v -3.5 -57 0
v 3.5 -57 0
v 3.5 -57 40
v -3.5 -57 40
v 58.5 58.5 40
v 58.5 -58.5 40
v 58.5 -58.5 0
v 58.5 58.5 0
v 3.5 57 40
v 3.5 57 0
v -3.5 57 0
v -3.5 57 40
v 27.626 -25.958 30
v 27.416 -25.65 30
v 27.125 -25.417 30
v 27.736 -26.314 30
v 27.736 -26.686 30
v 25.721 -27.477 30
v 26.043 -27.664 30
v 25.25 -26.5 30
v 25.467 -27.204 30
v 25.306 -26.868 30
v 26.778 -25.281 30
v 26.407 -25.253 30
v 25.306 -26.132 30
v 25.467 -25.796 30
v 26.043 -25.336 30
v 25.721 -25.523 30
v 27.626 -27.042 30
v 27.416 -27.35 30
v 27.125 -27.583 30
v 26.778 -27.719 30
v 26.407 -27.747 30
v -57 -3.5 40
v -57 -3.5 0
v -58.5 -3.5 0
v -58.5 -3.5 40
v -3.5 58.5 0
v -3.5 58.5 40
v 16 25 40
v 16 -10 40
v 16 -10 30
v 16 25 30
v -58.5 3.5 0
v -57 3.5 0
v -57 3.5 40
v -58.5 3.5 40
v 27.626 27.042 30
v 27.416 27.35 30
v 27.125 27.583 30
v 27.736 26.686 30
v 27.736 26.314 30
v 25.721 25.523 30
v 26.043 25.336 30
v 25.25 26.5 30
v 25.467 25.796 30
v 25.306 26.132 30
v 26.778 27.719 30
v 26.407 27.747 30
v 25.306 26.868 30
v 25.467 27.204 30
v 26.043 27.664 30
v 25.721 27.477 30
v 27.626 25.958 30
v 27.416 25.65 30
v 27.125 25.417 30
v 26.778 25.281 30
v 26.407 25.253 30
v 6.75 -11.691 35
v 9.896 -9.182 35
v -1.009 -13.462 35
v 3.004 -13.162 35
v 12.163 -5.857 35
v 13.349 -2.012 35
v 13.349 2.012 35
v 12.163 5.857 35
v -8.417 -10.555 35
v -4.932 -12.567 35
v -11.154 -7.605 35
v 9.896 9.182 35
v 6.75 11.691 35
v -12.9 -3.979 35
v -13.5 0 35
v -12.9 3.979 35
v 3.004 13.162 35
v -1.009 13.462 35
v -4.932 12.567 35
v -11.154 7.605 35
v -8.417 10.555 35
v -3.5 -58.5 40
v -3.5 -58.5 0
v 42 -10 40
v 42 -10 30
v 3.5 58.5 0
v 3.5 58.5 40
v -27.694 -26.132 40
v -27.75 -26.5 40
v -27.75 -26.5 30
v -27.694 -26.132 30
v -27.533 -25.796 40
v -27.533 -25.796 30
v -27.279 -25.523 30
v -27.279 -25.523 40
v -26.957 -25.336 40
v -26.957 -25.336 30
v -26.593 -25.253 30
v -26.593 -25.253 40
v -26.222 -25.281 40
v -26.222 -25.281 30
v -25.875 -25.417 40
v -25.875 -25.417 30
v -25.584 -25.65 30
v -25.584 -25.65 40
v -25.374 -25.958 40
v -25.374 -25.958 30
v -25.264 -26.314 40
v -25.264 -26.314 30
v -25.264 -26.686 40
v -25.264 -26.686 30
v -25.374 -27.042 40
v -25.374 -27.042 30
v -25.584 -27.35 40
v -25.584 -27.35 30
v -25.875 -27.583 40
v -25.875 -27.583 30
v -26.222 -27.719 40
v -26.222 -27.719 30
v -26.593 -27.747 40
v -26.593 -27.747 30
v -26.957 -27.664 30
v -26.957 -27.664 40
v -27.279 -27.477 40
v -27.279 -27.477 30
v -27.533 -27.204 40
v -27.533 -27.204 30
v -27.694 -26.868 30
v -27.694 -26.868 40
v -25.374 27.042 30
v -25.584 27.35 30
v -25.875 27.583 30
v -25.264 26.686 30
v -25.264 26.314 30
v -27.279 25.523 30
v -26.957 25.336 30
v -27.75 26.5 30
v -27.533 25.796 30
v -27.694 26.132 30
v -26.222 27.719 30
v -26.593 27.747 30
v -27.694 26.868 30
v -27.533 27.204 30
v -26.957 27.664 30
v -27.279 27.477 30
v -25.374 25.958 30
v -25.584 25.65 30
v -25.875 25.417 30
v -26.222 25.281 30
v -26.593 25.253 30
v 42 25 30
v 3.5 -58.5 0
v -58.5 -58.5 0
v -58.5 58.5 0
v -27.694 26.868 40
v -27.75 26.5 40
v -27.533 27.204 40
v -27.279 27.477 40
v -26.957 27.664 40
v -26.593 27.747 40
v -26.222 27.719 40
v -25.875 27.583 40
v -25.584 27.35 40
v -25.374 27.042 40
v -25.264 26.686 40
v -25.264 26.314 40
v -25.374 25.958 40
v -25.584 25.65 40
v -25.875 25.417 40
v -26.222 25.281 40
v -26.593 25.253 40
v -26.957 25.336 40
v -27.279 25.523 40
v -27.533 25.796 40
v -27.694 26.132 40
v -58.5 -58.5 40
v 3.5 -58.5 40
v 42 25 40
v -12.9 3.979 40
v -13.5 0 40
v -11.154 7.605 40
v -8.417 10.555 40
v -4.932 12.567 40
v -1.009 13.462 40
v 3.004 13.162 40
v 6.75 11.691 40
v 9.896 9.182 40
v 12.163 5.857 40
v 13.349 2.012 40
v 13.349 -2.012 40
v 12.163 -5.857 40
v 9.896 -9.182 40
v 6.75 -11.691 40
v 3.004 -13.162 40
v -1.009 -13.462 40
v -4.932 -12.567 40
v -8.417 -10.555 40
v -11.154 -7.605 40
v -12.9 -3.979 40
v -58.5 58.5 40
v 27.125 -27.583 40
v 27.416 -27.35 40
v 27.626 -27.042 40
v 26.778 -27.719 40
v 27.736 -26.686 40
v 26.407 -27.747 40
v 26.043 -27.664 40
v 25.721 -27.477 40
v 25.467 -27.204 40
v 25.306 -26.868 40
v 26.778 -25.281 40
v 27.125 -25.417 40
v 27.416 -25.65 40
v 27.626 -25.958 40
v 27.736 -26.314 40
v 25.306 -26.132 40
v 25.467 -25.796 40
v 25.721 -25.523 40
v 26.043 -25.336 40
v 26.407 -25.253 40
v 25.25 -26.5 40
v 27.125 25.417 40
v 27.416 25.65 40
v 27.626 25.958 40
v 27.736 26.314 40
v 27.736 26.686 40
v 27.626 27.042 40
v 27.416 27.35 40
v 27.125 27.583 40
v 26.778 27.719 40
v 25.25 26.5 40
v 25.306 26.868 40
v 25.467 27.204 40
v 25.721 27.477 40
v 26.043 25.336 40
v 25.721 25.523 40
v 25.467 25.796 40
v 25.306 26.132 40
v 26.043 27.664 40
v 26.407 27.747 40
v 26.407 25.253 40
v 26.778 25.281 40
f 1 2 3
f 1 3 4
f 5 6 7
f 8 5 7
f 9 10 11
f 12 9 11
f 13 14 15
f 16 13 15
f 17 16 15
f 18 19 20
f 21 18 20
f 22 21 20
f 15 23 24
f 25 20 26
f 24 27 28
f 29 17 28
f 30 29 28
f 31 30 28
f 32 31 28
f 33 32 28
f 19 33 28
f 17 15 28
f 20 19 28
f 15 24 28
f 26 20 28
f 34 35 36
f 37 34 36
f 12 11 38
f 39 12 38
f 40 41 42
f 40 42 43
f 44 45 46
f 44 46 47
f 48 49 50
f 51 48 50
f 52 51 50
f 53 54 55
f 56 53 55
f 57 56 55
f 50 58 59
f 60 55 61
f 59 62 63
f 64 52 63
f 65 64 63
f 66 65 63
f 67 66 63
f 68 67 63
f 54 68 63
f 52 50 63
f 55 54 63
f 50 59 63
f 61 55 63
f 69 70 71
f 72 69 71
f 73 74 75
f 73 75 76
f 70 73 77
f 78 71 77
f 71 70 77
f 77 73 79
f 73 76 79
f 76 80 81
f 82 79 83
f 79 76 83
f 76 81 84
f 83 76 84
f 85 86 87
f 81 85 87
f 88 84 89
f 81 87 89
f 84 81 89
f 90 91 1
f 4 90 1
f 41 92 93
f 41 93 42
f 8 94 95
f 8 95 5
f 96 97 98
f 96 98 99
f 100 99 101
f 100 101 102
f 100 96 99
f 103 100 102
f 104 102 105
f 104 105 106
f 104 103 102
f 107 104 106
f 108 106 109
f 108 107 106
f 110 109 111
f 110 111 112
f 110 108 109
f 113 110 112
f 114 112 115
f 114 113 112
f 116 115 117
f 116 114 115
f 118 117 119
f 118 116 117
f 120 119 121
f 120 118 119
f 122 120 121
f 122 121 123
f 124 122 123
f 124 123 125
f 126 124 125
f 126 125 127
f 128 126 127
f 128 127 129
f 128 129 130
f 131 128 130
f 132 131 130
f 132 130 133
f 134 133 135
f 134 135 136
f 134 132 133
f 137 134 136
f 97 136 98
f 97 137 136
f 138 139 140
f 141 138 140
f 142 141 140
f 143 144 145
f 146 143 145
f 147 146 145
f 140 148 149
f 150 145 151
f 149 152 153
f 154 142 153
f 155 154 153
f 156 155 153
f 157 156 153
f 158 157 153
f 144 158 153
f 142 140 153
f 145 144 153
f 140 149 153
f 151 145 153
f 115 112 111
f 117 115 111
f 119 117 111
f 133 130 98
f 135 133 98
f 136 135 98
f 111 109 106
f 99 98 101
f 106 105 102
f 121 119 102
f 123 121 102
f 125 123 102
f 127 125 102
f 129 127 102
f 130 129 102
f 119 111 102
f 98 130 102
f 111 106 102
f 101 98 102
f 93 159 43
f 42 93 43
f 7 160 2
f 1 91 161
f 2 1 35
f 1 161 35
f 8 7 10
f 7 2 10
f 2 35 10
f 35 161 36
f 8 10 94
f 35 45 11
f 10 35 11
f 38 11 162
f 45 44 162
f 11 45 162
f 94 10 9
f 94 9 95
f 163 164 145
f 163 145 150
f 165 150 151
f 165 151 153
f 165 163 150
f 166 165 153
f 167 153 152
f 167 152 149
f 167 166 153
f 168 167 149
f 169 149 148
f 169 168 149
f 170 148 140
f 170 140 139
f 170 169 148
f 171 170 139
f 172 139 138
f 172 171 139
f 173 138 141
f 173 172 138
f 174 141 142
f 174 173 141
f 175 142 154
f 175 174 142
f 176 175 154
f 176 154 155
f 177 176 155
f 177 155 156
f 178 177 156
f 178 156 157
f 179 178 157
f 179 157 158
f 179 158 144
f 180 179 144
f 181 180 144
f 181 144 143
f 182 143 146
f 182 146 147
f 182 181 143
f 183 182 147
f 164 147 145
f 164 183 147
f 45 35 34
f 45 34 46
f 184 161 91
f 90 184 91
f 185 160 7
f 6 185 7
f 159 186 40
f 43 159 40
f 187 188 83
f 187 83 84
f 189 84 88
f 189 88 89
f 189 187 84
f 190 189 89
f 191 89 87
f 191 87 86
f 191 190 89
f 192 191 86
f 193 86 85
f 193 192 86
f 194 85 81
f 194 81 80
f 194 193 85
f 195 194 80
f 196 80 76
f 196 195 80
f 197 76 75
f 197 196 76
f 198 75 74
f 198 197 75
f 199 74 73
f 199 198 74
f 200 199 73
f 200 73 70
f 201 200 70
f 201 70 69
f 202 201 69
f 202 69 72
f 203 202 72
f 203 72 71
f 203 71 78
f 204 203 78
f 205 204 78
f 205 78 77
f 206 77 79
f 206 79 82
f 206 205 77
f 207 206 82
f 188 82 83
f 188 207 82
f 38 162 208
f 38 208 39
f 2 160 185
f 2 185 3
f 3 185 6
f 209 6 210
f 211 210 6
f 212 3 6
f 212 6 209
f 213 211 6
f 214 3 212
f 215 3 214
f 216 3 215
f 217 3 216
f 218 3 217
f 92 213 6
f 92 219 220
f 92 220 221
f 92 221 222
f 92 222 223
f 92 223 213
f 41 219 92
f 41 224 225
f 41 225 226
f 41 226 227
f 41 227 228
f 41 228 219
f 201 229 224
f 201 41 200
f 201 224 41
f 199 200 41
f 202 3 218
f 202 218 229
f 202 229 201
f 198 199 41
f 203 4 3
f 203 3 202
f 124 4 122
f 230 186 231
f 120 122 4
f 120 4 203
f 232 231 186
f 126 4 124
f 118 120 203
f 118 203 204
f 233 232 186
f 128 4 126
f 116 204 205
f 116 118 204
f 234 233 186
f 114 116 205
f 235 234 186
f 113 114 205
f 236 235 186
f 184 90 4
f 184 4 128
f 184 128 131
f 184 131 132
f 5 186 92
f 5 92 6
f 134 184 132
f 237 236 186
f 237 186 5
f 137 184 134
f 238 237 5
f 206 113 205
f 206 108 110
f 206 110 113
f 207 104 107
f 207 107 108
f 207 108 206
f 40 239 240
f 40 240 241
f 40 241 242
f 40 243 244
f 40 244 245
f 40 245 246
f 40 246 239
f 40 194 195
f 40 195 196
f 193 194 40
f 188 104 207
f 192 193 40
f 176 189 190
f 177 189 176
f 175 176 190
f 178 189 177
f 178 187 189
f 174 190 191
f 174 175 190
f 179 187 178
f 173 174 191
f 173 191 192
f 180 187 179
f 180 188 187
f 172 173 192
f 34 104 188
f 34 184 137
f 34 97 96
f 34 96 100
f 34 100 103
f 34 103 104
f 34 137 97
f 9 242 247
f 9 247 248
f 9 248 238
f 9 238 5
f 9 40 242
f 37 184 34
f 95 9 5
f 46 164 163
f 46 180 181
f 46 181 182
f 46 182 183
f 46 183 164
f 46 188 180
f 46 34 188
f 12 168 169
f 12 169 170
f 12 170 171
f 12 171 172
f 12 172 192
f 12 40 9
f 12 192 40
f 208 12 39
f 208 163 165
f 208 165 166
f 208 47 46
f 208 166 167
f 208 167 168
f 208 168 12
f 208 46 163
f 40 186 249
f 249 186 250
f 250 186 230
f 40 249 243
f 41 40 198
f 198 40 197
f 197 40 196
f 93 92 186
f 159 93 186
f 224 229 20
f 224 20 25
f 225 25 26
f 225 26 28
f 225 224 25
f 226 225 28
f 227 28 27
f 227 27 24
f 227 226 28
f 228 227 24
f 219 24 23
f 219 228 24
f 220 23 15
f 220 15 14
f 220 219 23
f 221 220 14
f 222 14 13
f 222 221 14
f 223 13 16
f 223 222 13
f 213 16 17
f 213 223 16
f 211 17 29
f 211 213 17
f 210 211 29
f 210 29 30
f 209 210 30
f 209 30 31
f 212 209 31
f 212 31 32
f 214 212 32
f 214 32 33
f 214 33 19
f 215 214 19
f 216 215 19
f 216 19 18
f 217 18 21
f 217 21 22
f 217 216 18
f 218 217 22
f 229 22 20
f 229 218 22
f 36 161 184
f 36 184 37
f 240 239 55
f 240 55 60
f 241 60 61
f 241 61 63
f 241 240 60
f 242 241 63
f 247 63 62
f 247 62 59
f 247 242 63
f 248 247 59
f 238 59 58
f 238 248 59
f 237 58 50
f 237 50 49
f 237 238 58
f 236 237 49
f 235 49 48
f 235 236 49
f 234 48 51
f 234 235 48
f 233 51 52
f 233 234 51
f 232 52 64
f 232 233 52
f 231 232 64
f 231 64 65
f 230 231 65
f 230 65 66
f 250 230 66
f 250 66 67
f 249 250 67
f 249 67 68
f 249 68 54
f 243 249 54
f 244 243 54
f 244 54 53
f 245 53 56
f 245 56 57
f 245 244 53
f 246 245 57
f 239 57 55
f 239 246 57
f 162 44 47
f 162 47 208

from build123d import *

# Parameters (mm, degrees)
SKETCH1_W            = 117
SKETCH1_H            = 117
BODY_DEPTH           = 40
SKETCH4_W            = 7
SKETCH4_H            = 3
SKETCH4_W_2          = 3
SKETCH4_H_2          = 7
RAILS_HOUSINGS_DEPTH = 41
DRILL_START          = -40
SKETCH6_R            = 1.25
DRILL_HOLES_DEPTH    = 10
PCB_START            = -40
SKETCH7_W            = 26
SKETCH7_H            = 35
PCB_GAP_DEPTH        = 10
MOTOR_START          = -40
SKETCH8_R            = 13.5
MOTOR_GAP_DEPTH      = 5
SKETCH13_W           = 40
SKETCH13_H           = 7
BOSS_EXTRUDE4_DEPTH  = 1.5


with BuildPart() as part:
    # Sketch1 → body (new body)
    with BuildSketch(Plane.XY):
        Rectangle(SKETCH1_W, SKETCH1_H)
    extrude(amount=BODY_DEPTH)

    # Sketch4 → rails housings (cut, through all)
    with BuildSketch(Plane(origin=(0, 0, 0), x_dir=(-1, 0, 0), z_dir=(0, 0, -1))):
        with Locations((0, 58.5)):
            Rectangle(SKETCH4_W, SKETCH4_H)
        with Locations((58.5, 0)):
            Rectangle(SKETCH4_W_2, SKETCH4_H_2)
        with Locations((0, -58.5)):
            Rectangle(SKETCH4_W, SKETCH4_H)
        with Locations((-58.5, 0)):
            Rectangle(SKETCH4_W_2, SKETCH4_H_2)
    extrude(amount=-RAILS_HOUSINGS_DEPTH, mode=Mode.SUBTRACT)

    # Sketch6 → drill holes (cut)
    with BuildSketch(Plane(origin=(0, 0, 0), x_dir=(-1, 0, 0), z_dir=(0, 0, -1)).offset(DRILL_START)):
        with Locations((-26.5, 26.5)):
            Circle(SKETCH6_R)
        with Locations((26.5, 26.5)):
            Circle(SKETCH6_R)
        with Locations((26.5, -26.5)):
            Circle(SKETCH6_R)
        with Locations((-26.5, -26.5)):
            Circle(SKETCH6_R)
    extrude(amount=DRILL_HOLES_DEPTH, mode=Mode.SUBTRACT)

    # Sketch7 → PCB gap (cut)
    with BuildSketch(Plane(origin=(0, 0, 0), x_dir=(-1, 0, 0), z_dir=(0, 0, -1)).offset(PCB_START)):
        with Locations((-29, 7.5)):
            Rectangle(SKETCH7_W, SKETCH7_H)
    extrude(amount=PCB_GAP_DEPTH, mode=Mode.SUBTRACT)

    # Sketch8 → motor gap (cut)
    with BuildSketch(Plane(origin=(0, 0, 0), x_dir=(-1, 0, 0), z_dir=(0, 0, -1)).offset(MOTOR_START)):
        Circle(SKETCH8_R)
    extrude(amount=MOTOR_GAP_DEPTH, mode=Mode.SUBTRACT)

    # Sketch13 → Boss-Extrude4 (add)
    with BuildSketch(Plane(origin=(57, 0, 0), x_dir=(0, 0, -1), z_dir=(1, 0, 0))):
        with Locations((-20, 0)):
            Rectangle(SKETCH13_W, SKETCH13_H)
    extrude(amount=BOSS_EXTRUDE4_DEPTH)


solid = part.part
